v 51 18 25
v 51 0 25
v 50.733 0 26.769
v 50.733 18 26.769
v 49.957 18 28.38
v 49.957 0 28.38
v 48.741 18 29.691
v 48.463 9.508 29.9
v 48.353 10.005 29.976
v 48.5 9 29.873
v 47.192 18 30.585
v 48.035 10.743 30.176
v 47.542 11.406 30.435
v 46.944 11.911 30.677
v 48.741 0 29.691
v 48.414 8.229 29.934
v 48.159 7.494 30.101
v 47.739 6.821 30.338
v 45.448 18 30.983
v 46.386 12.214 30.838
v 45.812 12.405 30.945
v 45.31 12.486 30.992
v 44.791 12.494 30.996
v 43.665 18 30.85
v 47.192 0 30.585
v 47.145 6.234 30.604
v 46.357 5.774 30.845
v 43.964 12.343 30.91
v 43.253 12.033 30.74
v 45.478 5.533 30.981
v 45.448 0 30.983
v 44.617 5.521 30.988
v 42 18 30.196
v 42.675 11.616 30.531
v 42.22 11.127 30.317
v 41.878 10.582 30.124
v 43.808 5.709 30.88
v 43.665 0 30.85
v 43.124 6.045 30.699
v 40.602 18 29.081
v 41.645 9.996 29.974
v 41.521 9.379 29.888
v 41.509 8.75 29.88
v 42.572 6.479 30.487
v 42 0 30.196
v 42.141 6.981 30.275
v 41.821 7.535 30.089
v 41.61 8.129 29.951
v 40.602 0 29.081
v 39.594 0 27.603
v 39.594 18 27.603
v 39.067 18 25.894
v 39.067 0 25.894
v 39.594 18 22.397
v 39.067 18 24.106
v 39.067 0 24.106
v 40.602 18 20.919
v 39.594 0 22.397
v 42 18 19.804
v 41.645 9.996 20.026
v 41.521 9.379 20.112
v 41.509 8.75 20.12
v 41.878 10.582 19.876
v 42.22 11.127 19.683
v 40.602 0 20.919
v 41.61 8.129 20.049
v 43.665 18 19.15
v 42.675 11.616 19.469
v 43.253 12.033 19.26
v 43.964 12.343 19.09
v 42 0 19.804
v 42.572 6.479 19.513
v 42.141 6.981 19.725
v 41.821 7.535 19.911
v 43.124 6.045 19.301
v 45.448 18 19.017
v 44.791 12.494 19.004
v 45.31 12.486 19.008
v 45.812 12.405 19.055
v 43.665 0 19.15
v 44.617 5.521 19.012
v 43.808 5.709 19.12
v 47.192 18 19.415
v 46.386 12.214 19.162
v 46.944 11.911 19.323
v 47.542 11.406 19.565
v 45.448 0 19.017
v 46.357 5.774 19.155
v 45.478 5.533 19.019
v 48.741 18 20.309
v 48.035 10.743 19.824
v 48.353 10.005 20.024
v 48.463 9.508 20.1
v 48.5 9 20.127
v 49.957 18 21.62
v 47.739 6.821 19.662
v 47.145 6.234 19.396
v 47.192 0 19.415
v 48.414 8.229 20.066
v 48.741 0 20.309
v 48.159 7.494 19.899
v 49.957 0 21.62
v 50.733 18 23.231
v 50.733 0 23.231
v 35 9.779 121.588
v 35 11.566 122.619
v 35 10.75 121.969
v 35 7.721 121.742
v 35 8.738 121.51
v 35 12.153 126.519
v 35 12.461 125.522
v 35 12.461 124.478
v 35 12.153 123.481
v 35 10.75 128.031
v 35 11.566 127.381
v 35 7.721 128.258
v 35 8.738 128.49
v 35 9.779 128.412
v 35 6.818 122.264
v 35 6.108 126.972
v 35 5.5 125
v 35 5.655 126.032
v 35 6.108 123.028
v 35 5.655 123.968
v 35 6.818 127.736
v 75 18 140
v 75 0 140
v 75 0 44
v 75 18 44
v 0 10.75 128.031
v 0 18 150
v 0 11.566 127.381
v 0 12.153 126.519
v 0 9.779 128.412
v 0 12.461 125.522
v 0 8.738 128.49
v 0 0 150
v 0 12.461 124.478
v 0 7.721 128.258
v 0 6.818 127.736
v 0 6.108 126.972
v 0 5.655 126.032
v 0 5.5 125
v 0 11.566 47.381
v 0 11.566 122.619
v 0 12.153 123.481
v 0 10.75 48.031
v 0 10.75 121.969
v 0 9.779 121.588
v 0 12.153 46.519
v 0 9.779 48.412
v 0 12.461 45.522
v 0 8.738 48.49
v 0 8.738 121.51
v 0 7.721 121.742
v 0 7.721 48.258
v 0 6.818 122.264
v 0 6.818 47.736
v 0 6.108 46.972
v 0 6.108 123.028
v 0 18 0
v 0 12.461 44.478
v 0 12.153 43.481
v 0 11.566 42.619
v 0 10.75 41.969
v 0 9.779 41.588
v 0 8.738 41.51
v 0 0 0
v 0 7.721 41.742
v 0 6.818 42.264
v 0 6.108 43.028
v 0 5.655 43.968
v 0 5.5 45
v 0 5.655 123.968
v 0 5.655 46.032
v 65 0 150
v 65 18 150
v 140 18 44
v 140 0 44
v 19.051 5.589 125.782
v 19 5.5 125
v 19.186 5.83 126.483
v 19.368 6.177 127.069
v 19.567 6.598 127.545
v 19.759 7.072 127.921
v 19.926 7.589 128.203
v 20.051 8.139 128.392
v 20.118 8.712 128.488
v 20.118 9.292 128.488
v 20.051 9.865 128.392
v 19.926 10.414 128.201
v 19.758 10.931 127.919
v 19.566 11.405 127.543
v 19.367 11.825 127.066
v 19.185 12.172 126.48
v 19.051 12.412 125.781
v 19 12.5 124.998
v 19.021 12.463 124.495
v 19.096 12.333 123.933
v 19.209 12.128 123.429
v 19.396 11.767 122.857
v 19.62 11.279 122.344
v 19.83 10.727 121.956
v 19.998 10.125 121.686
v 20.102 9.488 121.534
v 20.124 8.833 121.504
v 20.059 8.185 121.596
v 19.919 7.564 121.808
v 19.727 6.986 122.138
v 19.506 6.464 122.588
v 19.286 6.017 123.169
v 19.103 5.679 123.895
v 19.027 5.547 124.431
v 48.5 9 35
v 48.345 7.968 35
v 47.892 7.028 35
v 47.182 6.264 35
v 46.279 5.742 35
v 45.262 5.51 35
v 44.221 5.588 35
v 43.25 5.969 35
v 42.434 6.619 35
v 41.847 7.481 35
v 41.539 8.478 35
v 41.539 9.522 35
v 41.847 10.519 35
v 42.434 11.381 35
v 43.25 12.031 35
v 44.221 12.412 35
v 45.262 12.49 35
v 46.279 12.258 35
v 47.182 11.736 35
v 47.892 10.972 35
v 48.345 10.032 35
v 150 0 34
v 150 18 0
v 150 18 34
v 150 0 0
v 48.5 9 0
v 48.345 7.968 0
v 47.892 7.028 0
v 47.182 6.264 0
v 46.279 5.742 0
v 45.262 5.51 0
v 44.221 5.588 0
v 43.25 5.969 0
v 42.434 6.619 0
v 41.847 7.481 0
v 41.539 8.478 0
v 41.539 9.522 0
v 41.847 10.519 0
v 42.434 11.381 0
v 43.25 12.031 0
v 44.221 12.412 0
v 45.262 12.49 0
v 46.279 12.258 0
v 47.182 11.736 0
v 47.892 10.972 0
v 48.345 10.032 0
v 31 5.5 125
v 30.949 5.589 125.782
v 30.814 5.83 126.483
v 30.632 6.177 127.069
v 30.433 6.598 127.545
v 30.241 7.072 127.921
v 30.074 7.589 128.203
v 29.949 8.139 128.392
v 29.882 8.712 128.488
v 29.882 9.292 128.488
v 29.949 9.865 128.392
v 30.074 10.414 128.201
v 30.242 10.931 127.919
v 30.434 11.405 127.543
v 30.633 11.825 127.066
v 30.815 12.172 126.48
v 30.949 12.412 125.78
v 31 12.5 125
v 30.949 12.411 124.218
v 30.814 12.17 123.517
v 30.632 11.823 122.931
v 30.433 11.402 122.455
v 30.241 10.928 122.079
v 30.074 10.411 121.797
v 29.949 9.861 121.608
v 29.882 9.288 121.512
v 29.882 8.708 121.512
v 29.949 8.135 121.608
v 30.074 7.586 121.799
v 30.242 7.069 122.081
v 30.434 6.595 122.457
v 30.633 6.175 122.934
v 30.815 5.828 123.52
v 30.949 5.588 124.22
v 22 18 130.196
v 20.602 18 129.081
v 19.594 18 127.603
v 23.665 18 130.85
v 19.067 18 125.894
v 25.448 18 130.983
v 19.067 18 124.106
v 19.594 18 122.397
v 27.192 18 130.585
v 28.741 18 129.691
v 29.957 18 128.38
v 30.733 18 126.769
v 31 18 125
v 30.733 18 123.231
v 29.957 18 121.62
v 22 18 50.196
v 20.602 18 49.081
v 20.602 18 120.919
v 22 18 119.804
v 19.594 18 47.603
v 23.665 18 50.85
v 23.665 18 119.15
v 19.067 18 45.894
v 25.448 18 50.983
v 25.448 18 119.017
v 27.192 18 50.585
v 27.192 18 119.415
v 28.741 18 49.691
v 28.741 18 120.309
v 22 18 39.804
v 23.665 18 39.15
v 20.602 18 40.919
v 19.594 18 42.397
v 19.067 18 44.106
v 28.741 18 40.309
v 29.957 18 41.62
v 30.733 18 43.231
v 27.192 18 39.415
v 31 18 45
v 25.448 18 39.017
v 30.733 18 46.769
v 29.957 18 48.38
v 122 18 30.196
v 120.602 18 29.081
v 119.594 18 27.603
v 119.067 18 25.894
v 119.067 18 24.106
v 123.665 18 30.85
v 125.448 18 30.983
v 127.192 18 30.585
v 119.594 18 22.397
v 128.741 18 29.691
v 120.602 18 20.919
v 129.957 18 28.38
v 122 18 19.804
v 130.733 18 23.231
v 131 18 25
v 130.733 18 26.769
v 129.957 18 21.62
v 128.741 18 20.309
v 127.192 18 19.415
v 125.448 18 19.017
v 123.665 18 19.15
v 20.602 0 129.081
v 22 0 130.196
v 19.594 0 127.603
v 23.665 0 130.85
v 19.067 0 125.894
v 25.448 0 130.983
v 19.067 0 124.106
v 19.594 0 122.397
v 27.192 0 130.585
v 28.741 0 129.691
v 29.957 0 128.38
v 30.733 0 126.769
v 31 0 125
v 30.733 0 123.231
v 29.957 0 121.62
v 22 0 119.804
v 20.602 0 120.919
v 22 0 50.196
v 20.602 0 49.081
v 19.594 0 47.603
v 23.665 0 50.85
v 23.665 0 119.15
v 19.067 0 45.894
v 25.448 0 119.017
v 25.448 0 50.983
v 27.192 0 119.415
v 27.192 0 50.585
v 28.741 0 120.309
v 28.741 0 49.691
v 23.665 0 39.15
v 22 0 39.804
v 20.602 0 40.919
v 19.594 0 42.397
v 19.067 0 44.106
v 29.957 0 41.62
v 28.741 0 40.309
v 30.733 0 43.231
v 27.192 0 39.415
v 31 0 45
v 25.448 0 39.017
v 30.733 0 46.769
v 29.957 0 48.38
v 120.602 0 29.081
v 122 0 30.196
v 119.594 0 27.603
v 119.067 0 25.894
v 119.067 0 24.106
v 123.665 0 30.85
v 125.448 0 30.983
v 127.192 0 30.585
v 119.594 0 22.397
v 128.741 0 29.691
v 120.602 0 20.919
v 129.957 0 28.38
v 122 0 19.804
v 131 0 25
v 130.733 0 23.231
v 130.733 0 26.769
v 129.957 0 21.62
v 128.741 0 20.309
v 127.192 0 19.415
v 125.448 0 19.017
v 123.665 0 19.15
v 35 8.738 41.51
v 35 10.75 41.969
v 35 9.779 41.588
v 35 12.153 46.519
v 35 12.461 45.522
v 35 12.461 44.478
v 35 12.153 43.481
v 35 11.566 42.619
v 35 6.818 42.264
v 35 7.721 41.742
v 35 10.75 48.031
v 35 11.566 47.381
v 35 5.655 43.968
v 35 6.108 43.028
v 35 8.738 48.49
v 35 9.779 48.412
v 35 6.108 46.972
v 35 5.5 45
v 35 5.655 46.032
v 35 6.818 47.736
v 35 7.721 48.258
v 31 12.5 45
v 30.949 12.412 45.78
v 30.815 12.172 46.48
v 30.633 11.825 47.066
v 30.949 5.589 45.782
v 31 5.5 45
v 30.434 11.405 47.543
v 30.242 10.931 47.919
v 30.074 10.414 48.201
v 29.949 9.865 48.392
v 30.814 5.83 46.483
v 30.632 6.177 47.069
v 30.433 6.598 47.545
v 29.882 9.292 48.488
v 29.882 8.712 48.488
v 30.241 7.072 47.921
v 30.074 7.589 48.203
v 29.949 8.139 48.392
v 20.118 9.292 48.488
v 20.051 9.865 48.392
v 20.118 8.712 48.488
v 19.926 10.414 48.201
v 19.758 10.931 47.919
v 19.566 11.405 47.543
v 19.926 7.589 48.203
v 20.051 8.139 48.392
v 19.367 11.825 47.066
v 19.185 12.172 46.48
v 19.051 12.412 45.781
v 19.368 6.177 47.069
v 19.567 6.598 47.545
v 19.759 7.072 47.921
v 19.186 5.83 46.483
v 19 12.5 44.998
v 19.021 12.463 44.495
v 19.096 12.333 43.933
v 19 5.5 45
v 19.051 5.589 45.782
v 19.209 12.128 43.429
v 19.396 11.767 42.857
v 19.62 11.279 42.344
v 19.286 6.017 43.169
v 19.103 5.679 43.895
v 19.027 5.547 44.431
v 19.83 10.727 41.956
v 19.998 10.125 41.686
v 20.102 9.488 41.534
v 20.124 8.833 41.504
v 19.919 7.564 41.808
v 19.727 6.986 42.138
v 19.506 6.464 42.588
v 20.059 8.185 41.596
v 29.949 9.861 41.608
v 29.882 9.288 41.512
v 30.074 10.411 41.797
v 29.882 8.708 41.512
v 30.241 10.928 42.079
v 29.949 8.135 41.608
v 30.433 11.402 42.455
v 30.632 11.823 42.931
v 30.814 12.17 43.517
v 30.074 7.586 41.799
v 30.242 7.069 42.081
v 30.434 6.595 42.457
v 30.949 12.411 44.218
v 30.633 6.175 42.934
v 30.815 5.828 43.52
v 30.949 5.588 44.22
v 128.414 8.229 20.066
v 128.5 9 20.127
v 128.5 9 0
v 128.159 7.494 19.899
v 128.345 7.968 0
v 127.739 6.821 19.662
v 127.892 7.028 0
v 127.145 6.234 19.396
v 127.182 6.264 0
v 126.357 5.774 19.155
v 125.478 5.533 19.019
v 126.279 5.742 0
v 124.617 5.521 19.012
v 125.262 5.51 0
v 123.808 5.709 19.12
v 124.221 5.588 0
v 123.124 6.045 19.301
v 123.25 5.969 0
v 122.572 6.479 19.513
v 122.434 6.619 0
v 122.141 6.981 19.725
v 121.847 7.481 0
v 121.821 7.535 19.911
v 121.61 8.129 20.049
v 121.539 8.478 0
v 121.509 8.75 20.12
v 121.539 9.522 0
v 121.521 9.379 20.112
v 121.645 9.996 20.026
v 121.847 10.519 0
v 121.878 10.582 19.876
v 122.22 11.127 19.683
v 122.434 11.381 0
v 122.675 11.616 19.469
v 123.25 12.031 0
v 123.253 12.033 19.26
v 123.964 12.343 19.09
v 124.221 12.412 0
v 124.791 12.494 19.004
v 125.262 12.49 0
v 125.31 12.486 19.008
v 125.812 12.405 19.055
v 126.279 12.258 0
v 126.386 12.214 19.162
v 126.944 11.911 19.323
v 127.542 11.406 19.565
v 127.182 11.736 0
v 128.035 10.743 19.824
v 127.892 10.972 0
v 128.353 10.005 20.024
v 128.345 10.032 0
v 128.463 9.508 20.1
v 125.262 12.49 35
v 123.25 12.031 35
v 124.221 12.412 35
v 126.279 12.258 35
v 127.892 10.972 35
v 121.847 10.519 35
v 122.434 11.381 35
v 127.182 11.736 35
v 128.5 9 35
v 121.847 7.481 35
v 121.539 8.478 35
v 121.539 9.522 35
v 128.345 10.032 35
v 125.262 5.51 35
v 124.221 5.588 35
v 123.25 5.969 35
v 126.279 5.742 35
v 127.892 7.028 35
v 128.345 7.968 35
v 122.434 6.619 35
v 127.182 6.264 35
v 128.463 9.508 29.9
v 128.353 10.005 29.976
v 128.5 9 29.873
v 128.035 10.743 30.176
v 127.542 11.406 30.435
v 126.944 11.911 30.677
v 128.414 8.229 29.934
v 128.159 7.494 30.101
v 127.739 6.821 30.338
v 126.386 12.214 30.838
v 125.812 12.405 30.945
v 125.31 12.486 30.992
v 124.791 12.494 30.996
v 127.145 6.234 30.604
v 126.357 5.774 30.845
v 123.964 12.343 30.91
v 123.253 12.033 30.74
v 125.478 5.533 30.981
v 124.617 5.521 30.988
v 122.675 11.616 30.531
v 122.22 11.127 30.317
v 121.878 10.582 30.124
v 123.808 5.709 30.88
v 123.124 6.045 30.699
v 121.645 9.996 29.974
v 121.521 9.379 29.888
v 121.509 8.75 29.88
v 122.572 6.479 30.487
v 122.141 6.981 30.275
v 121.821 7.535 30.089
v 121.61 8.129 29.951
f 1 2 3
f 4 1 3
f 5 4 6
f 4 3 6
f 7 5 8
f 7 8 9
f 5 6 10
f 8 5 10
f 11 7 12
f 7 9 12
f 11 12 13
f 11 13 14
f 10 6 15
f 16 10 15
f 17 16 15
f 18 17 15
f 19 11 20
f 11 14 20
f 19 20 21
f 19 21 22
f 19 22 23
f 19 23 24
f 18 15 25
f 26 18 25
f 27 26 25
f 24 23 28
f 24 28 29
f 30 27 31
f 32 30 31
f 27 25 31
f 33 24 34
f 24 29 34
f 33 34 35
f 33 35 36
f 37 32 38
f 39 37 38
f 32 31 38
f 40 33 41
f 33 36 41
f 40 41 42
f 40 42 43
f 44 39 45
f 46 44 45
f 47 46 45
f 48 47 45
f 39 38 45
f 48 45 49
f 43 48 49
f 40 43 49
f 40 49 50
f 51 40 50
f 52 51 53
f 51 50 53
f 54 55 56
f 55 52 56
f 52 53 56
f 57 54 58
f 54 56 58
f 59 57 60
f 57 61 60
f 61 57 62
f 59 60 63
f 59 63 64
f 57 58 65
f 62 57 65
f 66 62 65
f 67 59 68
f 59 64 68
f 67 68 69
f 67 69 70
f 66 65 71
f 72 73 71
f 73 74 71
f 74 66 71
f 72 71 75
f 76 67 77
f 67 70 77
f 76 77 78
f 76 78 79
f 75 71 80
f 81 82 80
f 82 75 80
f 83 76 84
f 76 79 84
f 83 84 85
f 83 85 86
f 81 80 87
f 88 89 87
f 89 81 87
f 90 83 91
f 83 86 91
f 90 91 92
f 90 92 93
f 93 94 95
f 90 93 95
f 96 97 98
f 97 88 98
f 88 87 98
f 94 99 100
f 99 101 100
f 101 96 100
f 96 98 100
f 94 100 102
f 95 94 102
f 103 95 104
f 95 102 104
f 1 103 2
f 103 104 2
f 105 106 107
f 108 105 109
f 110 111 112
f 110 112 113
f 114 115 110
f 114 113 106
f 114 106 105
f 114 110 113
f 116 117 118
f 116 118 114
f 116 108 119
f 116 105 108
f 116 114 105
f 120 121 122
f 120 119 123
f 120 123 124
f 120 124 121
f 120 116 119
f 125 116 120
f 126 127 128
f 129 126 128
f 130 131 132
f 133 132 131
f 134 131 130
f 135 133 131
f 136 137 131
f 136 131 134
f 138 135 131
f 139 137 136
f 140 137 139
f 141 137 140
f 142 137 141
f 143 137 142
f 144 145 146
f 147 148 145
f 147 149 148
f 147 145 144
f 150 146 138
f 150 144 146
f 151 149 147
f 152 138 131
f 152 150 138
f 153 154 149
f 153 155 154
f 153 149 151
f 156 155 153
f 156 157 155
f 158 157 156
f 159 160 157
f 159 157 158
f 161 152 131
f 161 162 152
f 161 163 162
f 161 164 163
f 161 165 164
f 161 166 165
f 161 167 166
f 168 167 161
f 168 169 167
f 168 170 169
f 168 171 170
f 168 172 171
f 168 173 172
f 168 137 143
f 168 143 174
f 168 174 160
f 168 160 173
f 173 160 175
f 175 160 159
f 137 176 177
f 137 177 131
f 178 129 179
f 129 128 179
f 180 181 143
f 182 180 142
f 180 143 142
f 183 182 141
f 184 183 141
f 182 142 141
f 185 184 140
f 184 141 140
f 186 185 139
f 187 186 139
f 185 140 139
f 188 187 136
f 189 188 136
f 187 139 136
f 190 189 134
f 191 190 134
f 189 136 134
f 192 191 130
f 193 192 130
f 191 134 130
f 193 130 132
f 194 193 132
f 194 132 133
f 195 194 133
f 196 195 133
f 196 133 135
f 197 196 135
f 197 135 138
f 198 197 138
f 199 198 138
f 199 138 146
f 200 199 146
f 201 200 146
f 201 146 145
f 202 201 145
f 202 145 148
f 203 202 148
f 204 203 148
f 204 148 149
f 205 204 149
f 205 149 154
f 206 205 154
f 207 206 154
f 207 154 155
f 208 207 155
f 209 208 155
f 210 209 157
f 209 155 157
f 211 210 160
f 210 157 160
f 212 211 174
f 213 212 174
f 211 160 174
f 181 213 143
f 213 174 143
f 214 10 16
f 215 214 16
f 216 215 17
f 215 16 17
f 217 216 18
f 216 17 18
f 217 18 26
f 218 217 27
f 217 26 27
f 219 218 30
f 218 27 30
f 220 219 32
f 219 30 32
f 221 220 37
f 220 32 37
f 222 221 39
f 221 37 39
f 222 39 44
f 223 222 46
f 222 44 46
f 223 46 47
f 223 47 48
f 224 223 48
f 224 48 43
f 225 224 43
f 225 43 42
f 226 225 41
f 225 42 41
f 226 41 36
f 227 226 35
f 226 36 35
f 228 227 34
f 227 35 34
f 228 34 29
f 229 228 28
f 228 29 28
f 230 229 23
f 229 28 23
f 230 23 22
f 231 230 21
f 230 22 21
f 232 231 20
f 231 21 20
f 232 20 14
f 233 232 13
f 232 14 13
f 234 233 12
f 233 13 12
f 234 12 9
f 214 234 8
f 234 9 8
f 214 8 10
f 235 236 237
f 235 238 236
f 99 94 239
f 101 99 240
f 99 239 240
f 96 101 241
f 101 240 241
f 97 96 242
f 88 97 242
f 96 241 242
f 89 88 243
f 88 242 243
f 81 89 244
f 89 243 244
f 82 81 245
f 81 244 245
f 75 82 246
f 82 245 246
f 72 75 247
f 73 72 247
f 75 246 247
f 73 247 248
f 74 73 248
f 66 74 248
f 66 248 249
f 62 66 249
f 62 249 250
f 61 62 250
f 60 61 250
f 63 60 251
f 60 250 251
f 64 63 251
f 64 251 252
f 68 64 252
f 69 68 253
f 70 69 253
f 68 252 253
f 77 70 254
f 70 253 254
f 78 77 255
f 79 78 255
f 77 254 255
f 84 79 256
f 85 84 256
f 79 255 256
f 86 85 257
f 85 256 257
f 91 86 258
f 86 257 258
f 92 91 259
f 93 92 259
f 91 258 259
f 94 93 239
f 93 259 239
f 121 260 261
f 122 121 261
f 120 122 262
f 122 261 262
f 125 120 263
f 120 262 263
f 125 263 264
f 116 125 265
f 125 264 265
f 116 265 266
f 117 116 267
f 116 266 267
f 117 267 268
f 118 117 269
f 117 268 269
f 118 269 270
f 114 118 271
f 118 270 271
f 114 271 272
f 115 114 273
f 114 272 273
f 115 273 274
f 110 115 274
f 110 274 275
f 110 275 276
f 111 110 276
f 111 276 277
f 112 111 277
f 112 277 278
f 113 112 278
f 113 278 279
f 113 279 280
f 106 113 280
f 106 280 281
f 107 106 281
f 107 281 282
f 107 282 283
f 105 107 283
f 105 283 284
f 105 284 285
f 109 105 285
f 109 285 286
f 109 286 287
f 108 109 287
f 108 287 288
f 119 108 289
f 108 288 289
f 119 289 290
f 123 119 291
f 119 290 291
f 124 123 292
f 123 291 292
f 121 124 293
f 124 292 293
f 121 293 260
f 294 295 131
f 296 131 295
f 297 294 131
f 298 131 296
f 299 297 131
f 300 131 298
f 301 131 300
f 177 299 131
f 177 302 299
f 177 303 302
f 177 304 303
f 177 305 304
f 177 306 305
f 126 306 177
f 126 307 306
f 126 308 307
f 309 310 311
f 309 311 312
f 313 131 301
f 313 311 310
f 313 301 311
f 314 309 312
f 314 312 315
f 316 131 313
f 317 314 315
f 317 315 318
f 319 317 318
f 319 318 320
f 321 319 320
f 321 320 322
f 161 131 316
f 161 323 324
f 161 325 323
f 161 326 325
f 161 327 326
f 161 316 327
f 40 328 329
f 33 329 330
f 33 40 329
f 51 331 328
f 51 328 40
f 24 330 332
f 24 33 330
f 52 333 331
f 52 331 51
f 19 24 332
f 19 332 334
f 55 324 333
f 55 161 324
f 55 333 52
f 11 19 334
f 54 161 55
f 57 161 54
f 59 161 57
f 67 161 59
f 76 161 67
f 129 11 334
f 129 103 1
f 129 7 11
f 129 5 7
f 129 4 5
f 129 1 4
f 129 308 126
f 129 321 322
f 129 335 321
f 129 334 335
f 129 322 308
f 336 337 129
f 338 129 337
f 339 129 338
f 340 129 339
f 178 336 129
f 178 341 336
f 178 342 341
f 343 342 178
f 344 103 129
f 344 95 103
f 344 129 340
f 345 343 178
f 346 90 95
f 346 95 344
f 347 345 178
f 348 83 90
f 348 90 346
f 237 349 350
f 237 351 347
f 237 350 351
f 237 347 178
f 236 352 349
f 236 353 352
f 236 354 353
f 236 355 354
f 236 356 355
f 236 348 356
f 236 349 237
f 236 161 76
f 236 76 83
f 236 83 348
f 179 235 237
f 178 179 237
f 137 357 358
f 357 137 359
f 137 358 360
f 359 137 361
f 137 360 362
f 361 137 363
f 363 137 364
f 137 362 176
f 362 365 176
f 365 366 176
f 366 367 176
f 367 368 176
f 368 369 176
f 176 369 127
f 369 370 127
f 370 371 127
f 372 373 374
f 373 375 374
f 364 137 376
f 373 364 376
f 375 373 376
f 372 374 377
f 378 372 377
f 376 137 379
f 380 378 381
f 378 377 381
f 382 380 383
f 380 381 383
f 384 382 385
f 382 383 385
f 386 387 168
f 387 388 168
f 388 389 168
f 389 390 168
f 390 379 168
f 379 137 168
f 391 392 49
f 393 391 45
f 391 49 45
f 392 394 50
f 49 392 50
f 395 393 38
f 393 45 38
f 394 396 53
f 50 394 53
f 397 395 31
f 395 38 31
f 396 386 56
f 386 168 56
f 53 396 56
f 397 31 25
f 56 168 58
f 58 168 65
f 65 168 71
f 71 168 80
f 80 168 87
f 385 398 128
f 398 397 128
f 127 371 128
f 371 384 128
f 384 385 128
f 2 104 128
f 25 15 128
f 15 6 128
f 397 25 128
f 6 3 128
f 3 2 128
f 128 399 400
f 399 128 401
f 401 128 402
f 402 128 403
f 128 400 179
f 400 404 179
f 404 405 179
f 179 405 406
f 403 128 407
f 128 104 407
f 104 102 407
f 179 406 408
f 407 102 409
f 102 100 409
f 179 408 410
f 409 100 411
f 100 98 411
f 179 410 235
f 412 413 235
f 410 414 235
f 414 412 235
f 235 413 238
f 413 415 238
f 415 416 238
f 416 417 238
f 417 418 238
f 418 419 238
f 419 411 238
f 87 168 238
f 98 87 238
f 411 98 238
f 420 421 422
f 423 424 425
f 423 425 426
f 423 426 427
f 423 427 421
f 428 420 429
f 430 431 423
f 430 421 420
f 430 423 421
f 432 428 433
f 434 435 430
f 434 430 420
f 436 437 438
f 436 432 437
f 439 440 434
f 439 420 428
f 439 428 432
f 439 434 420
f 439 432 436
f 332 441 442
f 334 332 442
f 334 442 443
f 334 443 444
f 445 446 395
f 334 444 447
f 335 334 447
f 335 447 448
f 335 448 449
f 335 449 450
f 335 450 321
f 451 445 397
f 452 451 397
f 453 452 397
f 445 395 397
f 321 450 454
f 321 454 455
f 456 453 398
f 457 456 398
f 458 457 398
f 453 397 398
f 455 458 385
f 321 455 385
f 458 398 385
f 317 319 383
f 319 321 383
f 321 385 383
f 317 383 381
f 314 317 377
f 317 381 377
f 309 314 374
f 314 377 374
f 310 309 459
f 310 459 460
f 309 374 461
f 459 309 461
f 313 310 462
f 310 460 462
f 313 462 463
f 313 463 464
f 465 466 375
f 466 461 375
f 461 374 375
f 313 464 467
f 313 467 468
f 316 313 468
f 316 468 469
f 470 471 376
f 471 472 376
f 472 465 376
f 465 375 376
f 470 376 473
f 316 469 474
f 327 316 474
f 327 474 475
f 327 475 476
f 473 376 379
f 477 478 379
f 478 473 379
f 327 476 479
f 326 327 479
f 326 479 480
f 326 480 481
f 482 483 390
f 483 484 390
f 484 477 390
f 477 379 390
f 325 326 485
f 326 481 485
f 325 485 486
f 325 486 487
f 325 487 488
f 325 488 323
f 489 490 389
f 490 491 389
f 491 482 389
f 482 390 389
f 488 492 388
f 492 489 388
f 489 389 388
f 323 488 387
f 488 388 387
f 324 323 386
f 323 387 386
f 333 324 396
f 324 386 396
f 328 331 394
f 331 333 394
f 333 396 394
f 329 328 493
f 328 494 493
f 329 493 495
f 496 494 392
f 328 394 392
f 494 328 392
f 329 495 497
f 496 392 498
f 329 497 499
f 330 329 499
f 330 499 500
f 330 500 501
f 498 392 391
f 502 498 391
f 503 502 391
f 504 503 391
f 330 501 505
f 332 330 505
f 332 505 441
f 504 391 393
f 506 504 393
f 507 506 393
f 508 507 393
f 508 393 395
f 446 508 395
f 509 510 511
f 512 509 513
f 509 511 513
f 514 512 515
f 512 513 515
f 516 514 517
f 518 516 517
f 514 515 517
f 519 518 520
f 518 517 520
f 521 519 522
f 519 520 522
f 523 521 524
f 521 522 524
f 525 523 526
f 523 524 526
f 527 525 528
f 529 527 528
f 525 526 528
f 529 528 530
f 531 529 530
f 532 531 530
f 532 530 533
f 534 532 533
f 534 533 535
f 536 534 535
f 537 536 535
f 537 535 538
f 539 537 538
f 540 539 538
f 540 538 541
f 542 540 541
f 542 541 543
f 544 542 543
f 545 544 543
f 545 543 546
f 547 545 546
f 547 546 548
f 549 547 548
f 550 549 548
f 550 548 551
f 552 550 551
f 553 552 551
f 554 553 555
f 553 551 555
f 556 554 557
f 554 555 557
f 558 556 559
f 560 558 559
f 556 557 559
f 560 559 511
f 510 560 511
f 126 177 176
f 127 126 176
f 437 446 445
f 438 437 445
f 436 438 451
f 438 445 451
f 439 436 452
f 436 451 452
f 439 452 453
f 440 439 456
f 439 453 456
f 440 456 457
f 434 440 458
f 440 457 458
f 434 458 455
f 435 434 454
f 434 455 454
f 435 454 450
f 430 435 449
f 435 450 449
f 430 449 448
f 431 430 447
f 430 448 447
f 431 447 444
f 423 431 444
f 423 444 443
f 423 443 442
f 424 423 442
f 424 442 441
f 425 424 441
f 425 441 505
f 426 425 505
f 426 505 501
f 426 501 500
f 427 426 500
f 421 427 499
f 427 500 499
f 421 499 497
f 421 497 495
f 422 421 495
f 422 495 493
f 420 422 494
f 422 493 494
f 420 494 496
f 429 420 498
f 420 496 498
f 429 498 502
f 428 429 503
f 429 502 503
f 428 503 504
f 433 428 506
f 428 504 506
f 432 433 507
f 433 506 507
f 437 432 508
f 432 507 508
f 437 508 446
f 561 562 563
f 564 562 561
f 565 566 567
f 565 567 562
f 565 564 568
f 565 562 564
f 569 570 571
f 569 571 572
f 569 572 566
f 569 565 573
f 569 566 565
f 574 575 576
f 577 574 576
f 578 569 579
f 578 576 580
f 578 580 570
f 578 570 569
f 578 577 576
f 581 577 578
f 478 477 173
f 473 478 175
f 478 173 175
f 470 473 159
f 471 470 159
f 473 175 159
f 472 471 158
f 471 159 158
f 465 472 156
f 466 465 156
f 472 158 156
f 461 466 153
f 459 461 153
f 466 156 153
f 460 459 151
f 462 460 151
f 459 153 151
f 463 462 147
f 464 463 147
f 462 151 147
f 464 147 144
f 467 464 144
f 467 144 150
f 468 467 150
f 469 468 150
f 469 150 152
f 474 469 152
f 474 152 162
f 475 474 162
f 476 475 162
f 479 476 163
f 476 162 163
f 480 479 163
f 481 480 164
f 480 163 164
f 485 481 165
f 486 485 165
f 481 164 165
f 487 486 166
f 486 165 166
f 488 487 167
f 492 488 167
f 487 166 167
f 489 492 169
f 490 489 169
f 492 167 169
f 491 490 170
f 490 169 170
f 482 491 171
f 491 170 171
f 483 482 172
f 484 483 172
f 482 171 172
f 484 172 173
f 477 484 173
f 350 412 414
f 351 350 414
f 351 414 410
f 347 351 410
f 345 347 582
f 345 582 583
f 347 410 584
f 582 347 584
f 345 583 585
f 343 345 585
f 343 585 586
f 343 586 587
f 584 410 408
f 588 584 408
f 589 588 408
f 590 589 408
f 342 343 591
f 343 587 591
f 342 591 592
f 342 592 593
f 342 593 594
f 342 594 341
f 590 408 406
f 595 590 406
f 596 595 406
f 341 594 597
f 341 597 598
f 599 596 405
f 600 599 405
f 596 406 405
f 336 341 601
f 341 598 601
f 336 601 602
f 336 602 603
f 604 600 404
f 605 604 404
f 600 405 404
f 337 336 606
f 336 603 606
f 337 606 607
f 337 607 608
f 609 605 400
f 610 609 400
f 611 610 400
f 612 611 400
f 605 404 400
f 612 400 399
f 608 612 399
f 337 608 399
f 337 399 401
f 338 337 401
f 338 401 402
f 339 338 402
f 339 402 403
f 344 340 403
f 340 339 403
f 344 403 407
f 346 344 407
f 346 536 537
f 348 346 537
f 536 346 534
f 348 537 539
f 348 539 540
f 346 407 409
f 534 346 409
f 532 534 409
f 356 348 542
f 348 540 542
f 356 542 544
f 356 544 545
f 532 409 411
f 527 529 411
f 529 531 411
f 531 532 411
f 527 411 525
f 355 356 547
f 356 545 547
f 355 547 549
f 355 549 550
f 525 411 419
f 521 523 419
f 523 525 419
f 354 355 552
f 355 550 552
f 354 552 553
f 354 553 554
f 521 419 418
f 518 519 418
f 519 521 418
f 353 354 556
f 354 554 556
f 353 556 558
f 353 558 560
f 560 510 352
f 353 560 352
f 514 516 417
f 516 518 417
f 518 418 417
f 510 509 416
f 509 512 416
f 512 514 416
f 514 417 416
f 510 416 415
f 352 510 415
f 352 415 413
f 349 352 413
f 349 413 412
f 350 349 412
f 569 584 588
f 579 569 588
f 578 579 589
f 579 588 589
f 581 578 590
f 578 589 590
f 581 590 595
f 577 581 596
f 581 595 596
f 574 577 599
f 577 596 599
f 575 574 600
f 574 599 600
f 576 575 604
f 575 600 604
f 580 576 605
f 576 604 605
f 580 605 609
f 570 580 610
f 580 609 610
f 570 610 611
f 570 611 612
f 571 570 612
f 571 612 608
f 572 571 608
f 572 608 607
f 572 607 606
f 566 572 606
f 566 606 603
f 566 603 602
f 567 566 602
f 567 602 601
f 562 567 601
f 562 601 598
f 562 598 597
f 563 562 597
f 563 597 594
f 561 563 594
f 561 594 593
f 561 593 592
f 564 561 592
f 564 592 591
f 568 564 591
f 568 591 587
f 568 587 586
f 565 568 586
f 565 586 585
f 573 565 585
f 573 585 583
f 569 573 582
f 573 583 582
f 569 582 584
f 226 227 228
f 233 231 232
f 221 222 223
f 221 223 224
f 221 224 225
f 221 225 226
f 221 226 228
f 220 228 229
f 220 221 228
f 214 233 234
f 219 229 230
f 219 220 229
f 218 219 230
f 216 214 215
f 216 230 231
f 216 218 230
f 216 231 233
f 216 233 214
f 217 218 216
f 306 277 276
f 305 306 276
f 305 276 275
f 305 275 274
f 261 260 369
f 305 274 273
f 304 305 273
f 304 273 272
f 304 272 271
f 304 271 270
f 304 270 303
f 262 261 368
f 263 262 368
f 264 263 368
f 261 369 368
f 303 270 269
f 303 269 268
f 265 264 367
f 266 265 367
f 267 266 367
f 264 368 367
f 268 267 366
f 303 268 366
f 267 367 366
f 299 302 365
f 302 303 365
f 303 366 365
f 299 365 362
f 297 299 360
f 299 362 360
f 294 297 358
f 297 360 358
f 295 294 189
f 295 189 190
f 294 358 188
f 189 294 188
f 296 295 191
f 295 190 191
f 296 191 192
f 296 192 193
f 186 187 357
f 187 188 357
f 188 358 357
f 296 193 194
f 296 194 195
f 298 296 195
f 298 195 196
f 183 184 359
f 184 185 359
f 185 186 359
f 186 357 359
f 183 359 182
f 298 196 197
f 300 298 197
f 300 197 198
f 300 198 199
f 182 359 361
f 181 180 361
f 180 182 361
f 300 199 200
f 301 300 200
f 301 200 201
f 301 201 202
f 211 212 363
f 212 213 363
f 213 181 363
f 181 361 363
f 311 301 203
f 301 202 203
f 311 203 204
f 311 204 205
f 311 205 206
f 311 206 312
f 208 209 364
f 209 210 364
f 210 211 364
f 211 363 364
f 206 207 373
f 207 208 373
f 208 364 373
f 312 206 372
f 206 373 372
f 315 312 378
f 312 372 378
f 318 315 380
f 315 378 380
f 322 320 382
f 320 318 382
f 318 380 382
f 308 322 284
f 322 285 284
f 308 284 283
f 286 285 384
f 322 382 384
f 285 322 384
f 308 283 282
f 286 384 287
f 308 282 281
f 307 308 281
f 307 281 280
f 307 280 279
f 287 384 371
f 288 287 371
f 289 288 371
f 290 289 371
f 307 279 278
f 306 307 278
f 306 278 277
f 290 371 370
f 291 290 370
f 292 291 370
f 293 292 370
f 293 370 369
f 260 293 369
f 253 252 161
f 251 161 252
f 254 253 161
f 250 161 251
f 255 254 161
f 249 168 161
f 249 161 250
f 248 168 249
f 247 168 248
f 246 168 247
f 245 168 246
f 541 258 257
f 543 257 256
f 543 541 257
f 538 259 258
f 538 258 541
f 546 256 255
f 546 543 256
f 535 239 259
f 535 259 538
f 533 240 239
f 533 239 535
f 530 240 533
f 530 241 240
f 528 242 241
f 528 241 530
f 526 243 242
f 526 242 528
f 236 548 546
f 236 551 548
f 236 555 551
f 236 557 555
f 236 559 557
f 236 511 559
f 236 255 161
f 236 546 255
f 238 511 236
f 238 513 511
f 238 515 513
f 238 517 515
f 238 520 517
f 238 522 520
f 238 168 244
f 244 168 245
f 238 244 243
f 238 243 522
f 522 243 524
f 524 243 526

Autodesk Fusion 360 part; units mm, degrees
sketch "Front" plane through (0, 0, 0) normal (0, 1, 0) x (1, 0, 0)
  line L0 (0, 0) -> (150, 0)
  line L1 (150, 0) -> (150, -44)
  line L2 (75, -150) -> (0, -150)
  line L3 (0, -150) -> (0, 0)
  line L4 (75, -150) -> (75, -44)
  line L5 (75, -44) -> (150, -44)
  line L6 (25, -150) -> (25, 0) construction
  line L7 (0, -25) -> (150, -25) construction
  circle A0 centre (45, -25) radius 6
  circle A1 centre (125, -25) radius 6
  circle A2 centre (25, -45) radius 6
  circle A3 centre (25, -125) radius 6
  dimension "d1" = 150
  dimension "d2" = 150
  dimension "d5" = 75
  dimension "d6" = 106
  dimension "d7" = 25
  dimension "d8" = 25
  dimension "d9" = 12
  dimension "d10" = 12
  dimension "d11" = 12
  dimension "d12" = 12
  dimension "d13" = 80
  dimension "d14" = 80
  dimension "d15" = 45
  dimension "d16" = 45
extrude "Extrude1" add sketch "Front" along normal blind 18
chamfer "Chamfer1" distance 10 angle 45 1 edges at (75, 9, 150)
chamfer "Chamfer2" distance 10 angle 45 1 edges at (150, 9, 44)
sketch "Left" plane through (0, 0, 0) normal (-1, 0, 0) x (0, -1, 0)
  line L0 (0, 0) -> (0, 150)
  line L1 (0, 150) -> (-18, 150)
  line L2 (-18, 150) -> (-18, 0)
  line L3 (-18, 0) -> (0, 0)
  line L4 (-9, 0) -> (-9, 150) construction
  circle A0 centre (-9, 45) radius 3.5
  circle A1 centre (-9, 125) radius 3.5
  dimension "d21" = 7
  dimension "d22" = 7
  dimension "d23" = 45
  dimension "d24" = 80
extrude "Extrude2" cut sketch "Left" against normal blind 35 contours A0 | A1
sketch "Bottom" plane through (0, 0, 0) normal (0, 0, -1) x (1, 0, 0)
  line L0 (150, 0) -> (0, 0)
  line L1 (0, 0) -> (0, -18)
  line L2 (0, -18) -> (150, -18)
  line L3 (150, -18) -> (150, 0)
  line L4 (0, -9) -> (150, -9) construction
  circle A0 centre (45, -9) radius 3.5
  circle A1 centre (125, -9) radius 3.5
  dimension "d27" = 7
  dimension "d28" = 7
  dimension "d29" = 45
  dimension "d30" = 80
extrude "Extrude3" cut sketch "Bottom" against normal blind 35 contours A0 | A1
